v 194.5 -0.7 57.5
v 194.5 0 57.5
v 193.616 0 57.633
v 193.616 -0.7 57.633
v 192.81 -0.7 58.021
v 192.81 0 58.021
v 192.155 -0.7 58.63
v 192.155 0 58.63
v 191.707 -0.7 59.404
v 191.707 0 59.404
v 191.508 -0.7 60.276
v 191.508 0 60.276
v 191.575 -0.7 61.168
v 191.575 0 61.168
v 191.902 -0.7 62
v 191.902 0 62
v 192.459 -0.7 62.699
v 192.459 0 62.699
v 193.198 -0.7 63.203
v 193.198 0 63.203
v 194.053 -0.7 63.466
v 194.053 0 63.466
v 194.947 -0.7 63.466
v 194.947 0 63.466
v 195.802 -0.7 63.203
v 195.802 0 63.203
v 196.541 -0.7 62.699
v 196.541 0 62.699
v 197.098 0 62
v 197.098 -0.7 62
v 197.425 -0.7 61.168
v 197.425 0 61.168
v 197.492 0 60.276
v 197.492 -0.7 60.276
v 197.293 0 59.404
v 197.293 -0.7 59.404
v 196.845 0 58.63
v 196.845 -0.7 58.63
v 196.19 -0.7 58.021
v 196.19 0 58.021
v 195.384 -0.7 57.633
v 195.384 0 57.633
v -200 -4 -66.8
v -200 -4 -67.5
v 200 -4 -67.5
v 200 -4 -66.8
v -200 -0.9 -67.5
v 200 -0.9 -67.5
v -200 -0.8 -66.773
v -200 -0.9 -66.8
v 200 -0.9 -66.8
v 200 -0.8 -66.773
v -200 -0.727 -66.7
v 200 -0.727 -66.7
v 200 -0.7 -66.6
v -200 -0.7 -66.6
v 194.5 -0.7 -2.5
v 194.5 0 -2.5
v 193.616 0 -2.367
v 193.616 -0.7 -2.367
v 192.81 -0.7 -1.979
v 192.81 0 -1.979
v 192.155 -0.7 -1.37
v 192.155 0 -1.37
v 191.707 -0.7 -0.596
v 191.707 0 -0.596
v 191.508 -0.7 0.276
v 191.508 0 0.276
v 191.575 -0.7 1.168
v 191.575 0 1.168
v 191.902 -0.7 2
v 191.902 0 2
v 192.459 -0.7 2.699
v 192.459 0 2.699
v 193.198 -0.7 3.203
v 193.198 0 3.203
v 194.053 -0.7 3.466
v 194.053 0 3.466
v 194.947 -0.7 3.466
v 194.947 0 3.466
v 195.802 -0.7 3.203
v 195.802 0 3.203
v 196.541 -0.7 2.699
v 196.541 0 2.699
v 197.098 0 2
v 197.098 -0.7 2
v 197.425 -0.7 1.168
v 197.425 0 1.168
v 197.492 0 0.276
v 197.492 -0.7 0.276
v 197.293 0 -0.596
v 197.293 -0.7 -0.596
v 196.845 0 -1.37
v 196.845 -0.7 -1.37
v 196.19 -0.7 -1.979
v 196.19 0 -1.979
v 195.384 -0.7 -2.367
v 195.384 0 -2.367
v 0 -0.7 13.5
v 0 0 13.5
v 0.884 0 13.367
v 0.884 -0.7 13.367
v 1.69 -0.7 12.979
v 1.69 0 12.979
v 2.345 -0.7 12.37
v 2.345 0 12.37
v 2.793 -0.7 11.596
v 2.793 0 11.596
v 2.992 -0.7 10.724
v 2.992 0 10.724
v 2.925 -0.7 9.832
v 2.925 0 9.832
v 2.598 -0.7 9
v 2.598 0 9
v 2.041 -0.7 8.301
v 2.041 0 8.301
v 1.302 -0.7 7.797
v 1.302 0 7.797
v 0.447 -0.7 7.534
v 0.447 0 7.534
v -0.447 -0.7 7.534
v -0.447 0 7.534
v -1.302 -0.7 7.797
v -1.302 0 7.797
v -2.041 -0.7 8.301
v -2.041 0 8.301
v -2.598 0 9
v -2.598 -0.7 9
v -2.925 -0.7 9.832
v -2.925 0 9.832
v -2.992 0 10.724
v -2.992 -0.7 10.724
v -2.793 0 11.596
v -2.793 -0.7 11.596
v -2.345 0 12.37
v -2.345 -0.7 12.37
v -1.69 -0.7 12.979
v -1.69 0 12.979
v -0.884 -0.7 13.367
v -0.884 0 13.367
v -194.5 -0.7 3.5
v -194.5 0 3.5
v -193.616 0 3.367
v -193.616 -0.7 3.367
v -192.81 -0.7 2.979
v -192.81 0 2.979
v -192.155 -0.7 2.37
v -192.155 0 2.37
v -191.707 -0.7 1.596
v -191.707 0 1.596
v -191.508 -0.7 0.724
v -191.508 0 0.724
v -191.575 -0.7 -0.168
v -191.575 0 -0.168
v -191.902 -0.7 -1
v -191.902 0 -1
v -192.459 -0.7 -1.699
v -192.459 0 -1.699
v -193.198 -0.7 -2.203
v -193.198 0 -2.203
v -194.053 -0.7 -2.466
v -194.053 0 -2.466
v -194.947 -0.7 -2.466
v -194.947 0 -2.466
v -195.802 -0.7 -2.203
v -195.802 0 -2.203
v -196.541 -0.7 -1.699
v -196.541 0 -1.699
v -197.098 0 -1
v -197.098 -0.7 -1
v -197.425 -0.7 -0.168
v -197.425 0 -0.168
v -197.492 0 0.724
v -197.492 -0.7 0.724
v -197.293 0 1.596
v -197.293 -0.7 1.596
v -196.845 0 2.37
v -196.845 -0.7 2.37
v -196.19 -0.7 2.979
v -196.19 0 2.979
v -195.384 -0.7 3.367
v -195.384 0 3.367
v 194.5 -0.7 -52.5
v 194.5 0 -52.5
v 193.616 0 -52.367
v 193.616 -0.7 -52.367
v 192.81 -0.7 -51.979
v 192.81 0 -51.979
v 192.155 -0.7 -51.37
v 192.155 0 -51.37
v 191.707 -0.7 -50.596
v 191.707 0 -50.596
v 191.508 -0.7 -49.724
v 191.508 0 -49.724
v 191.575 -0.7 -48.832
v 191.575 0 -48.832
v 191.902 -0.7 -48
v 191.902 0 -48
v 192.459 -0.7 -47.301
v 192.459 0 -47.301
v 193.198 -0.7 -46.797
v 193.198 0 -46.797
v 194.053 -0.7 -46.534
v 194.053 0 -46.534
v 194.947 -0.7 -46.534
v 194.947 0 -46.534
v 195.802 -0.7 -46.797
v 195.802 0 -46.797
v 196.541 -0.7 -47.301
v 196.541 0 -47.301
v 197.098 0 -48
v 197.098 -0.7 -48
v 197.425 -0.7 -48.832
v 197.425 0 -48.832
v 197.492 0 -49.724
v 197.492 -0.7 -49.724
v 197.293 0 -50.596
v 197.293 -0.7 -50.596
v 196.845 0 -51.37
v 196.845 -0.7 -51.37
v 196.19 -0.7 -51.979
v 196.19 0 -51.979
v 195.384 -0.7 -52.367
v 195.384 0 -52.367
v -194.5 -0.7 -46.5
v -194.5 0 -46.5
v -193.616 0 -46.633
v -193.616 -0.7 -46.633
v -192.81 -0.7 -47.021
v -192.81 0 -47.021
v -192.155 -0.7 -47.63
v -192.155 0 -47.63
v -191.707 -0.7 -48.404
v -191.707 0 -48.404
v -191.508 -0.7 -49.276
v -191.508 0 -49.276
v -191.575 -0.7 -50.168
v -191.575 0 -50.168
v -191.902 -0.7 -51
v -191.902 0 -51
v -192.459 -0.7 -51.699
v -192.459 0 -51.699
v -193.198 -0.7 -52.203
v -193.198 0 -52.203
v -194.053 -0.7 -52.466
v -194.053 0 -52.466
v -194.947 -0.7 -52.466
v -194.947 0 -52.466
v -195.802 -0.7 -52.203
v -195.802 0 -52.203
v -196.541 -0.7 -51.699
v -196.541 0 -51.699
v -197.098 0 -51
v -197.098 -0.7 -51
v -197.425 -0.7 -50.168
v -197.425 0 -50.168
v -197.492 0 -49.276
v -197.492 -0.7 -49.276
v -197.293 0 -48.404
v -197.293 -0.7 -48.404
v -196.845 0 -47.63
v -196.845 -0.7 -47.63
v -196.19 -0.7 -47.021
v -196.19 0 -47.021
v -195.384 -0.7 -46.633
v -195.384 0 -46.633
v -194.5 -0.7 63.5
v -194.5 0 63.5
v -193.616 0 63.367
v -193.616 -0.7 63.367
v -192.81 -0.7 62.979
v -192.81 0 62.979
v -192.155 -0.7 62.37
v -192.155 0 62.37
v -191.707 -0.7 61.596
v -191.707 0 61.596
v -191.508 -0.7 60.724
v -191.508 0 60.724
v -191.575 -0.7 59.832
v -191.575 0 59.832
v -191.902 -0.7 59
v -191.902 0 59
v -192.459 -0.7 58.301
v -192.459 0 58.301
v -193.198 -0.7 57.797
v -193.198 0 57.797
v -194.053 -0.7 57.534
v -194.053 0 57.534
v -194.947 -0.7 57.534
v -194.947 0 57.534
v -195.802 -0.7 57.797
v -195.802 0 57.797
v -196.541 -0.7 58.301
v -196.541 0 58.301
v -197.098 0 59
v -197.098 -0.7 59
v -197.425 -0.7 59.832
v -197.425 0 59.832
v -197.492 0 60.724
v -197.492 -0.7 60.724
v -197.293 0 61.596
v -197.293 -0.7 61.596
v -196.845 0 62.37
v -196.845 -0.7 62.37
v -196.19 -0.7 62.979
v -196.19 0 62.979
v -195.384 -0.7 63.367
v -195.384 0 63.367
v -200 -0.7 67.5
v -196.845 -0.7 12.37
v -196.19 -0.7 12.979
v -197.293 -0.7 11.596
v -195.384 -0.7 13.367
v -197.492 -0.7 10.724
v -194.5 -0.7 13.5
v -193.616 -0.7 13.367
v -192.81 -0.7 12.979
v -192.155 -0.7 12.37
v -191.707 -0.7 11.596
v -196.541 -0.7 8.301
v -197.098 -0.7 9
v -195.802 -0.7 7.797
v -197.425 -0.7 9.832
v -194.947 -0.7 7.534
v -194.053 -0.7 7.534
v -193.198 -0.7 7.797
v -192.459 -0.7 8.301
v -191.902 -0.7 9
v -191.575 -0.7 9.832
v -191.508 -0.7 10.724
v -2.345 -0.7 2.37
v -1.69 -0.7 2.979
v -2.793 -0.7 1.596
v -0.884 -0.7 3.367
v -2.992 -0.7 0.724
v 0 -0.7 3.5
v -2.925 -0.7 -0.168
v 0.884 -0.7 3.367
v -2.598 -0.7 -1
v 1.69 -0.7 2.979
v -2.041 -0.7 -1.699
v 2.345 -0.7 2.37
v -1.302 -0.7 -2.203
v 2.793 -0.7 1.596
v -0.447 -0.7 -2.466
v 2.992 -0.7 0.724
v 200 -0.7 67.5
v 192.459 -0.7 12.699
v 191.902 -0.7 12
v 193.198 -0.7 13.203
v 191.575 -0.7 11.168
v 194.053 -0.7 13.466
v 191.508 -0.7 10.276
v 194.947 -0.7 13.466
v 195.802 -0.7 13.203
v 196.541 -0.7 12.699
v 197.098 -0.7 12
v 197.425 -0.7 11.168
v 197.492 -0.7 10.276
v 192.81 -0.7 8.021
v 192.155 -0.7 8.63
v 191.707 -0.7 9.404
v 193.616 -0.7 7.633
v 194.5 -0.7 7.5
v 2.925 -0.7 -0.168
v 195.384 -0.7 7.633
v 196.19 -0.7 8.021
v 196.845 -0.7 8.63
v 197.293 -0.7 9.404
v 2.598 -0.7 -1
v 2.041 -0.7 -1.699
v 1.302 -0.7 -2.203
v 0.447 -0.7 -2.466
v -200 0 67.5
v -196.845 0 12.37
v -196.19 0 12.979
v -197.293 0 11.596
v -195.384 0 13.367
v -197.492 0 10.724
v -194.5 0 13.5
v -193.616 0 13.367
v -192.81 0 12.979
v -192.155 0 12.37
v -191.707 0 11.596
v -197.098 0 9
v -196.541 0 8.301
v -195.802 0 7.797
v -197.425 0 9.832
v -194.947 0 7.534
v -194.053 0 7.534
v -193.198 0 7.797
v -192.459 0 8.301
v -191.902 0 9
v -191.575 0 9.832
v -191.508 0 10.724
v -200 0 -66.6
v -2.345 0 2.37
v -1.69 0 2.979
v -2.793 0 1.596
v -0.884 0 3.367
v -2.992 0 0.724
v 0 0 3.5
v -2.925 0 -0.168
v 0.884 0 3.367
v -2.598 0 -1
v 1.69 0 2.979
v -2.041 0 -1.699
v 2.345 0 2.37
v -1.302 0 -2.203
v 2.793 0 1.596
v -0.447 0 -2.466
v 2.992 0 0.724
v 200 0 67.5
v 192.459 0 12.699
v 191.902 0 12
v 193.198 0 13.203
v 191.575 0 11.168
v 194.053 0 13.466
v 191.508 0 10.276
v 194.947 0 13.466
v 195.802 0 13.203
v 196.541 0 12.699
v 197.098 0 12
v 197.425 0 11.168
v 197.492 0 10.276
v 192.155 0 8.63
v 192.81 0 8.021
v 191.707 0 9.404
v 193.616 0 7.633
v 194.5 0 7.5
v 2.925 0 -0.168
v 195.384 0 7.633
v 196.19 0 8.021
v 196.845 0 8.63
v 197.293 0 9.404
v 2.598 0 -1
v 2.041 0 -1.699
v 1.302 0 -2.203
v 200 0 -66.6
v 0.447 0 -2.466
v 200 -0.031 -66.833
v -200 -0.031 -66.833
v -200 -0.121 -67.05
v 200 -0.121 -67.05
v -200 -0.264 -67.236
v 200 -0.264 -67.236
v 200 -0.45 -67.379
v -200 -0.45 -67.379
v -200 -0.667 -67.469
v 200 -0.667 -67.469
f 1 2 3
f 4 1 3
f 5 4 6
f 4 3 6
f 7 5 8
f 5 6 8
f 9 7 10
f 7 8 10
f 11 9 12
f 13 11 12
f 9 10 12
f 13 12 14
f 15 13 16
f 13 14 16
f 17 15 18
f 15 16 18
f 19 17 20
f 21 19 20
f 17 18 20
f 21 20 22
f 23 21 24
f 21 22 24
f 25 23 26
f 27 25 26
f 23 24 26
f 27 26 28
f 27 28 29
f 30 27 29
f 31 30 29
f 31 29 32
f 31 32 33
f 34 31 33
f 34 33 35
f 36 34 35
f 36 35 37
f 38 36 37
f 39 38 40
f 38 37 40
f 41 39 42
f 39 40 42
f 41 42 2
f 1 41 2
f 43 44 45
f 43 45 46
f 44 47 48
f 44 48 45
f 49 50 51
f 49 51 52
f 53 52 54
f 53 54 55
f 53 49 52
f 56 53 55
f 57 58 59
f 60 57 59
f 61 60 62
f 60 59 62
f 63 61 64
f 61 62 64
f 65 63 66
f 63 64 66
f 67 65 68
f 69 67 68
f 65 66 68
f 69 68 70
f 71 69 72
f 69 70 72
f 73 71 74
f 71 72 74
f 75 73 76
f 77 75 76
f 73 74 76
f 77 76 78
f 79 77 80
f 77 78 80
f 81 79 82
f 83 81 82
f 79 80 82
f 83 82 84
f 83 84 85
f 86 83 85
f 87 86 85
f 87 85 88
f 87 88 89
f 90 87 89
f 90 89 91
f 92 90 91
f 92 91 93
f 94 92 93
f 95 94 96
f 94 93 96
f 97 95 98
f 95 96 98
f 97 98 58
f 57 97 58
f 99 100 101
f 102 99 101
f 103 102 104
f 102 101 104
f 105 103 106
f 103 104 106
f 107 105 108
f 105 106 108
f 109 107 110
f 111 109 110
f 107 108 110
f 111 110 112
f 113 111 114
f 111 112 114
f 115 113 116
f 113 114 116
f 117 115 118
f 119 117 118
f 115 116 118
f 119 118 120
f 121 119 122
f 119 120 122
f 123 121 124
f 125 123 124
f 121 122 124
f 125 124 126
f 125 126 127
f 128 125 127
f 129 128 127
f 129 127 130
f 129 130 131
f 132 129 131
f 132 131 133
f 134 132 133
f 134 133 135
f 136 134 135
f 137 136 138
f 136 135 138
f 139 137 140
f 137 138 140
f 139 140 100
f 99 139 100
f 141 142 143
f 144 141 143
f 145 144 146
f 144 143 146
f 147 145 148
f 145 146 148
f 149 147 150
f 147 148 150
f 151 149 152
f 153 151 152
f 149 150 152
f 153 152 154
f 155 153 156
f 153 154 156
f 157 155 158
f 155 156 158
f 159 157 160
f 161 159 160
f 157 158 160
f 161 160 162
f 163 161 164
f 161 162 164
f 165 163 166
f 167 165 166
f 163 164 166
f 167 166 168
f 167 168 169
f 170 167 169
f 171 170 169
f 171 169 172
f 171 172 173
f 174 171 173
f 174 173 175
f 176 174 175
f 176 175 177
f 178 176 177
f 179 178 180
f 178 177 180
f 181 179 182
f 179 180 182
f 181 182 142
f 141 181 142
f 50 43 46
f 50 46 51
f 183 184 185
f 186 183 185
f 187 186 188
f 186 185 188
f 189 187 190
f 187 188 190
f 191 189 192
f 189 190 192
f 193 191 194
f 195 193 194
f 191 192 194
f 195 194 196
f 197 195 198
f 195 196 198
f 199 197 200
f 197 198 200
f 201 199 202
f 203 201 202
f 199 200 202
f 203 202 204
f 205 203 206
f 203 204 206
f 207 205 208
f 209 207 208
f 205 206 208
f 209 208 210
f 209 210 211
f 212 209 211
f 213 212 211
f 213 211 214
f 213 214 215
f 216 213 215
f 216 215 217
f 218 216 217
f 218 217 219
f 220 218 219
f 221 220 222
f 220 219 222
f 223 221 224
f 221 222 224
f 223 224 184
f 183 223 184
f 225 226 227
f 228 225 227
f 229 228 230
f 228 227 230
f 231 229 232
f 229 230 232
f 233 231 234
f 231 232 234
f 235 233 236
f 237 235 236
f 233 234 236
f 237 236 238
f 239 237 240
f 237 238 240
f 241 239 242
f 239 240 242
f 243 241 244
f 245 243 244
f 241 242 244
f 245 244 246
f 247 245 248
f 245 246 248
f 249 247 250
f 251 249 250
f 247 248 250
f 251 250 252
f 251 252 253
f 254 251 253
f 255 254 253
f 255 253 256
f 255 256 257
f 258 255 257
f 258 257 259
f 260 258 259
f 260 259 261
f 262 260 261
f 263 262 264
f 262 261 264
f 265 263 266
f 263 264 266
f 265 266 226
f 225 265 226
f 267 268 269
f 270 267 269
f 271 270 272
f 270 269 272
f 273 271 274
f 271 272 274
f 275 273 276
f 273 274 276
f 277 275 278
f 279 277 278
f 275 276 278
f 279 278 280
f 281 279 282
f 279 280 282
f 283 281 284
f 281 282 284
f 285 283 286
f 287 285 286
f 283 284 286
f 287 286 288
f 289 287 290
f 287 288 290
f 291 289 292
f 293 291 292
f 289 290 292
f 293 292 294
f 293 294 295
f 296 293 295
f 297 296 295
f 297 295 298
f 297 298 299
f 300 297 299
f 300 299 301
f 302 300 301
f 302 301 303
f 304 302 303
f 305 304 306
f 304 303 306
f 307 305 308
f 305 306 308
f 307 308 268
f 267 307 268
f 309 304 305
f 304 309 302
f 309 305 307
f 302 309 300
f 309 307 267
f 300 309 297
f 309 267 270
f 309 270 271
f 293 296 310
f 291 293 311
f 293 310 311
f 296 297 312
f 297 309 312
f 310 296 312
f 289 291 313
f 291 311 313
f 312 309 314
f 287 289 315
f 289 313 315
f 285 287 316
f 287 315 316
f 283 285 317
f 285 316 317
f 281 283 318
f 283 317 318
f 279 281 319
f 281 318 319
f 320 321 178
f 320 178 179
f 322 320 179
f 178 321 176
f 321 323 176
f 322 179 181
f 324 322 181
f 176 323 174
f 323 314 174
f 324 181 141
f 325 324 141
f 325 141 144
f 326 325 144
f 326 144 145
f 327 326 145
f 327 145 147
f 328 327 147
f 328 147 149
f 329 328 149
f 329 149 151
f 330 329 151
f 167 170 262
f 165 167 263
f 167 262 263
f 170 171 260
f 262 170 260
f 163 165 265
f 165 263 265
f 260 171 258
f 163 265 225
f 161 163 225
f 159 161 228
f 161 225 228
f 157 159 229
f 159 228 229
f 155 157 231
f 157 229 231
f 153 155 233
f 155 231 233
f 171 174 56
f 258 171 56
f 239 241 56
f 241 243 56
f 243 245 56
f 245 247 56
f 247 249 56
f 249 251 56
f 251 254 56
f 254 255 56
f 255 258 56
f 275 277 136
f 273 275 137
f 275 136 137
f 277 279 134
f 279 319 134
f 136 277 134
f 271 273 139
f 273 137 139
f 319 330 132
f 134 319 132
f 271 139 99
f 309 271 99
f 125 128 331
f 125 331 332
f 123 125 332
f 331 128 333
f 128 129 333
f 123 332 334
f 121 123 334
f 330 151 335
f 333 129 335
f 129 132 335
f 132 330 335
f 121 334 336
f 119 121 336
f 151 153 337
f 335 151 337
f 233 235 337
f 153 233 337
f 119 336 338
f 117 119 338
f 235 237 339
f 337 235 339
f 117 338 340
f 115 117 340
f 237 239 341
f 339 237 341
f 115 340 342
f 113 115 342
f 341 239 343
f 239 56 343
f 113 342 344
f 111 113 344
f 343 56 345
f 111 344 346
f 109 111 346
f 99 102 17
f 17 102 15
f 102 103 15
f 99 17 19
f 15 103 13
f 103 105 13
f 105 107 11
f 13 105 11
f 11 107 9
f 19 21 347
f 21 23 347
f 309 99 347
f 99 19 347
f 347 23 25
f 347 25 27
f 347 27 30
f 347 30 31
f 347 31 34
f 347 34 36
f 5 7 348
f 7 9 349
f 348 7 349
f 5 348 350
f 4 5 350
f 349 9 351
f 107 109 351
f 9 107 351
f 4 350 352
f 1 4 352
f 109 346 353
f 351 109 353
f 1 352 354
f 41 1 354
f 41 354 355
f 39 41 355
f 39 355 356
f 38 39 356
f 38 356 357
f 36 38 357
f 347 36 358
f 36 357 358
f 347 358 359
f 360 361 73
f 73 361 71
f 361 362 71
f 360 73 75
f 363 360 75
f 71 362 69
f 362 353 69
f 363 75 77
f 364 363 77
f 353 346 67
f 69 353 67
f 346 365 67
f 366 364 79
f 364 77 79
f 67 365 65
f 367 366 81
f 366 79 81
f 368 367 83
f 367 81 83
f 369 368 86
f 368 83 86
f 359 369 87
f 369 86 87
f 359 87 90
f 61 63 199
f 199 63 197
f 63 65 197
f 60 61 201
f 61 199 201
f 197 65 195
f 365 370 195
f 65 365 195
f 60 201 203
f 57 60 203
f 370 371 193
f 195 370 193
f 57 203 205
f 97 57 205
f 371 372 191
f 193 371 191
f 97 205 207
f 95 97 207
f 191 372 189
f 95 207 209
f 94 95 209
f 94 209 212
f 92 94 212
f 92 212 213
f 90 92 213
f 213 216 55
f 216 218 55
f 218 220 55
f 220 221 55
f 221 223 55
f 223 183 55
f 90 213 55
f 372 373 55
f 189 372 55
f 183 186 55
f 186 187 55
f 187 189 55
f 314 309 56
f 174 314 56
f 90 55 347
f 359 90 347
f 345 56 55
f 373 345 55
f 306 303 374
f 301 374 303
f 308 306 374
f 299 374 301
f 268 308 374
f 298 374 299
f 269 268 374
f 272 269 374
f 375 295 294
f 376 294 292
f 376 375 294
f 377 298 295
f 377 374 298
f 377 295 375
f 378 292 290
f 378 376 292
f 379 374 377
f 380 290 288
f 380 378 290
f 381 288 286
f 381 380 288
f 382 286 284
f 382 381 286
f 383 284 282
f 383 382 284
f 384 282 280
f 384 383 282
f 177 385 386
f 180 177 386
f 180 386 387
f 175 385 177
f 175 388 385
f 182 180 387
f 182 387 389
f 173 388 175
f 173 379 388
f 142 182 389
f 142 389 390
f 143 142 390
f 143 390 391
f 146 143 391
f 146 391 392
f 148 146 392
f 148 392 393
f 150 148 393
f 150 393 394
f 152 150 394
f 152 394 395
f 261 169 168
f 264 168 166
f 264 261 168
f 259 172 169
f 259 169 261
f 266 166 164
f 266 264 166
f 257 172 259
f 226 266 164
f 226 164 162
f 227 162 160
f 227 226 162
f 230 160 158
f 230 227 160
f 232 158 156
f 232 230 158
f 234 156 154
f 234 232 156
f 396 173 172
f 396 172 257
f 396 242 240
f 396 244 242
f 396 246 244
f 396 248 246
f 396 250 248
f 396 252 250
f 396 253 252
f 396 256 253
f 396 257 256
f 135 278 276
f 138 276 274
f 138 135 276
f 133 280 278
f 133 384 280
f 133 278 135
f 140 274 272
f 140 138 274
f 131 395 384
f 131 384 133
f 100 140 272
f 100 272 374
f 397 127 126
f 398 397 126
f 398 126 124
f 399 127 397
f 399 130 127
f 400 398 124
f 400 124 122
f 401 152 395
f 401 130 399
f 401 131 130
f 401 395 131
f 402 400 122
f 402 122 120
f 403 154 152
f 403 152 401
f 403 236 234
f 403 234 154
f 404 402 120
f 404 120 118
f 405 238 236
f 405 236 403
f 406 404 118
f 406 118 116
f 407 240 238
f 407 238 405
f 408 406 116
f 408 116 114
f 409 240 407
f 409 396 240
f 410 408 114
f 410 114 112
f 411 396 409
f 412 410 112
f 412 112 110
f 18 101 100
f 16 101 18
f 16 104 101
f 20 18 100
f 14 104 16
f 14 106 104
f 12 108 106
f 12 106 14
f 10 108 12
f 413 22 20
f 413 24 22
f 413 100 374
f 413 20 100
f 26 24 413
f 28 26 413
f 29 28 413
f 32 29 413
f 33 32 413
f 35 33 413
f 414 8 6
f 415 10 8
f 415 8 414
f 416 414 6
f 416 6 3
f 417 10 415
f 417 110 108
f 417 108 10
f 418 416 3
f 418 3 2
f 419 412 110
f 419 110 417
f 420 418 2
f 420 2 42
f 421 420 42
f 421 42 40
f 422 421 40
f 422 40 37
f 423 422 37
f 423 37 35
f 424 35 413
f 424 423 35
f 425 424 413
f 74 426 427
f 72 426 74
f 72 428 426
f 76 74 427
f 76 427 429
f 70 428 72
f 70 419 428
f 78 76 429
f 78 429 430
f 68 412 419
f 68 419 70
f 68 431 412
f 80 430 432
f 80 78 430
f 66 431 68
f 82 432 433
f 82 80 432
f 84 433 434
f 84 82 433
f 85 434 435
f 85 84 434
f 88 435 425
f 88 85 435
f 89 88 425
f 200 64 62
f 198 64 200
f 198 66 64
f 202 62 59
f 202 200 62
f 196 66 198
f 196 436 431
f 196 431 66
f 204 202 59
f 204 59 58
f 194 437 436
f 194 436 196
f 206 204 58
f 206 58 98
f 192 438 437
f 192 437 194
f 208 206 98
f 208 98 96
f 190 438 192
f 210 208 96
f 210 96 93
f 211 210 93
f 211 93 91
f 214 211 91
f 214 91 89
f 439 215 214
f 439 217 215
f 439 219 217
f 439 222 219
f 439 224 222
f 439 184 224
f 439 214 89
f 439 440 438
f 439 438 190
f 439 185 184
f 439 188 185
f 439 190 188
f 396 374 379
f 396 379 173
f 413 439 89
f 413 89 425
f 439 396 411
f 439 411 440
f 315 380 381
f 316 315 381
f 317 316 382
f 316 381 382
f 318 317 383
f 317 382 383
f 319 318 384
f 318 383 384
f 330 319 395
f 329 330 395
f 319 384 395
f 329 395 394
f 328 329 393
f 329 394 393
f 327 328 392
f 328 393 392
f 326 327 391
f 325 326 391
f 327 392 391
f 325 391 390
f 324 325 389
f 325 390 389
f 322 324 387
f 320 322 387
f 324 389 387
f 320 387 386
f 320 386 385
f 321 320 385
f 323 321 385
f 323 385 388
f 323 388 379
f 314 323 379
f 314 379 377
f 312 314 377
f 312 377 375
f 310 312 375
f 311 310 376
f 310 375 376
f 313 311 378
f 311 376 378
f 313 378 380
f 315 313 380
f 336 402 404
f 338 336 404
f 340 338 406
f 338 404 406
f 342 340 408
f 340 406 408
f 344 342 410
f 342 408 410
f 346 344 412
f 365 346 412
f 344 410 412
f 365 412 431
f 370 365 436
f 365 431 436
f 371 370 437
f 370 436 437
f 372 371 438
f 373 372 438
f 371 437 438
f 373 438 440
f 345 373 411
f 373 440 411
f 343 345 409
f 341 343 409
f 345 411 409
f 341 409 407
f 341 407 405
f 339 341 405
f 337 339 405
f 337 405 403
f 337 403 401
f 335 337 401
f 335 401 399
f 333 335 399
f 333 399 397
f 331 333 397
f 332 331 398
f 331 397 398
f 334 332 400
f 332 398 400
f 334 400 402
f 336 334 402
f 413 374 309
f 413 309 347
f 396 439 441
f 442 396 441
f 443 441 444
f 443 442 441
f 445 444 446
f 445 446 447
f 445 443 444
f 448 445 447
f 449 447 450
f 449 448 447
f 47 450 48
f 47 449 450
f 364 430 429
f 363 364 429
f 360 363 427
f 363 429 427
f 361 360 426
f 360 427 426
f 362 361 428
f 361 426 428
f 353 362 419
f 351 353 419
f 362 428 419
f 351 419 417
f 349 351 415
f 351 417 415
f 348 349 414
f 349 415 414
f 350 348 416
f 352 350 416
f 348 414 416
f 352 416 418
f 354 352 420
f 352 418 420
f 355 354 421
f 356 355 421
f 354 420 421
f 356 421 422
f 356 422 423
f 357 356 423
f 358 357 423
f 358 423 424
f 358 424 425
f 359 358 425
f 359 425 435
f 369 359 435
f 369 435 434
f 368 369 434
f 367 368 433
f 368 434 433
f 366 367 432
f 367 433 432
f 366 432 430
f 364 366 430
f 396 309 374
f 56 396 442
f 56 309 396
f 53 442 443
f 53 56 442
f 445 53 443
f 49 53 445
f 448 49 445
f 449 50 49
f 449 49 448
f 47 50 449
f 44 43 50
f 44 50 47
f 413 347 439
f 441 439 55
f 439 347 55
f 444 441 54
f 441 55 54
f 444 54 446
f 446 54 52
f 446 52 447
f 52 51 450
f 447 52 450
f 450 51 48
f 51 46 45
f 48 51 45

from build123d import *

# Parameters (mm, degrees)
SKETCH_1_W                       = 400
SKETCH_1_H                       = 135
SKETCH_1_R                       = 3
SM_BASE_FLANGE_1_DEPTH           = 0.7
SM_EDGE_FLANGE_1_STRIP_W         = 3.2
SM_EDGE_FLANGE_1_STRIP_H         = 0.7
SM_EDGE_FLANGE_1_STRIP_CUT_DEPTH = 400
SM_EDGE_FLANGE_1_DEPTH           = 400


# Sheet-metal steps are written as plain solids
with BuildPart() as part:
    # Sketch 1 → 基体-法兰1 (new body)
    with BuildSketch(Plane(origin=(0, 0, 0), x_dir=(1, 0, 0), z_dir=(0, 1, 0))):
        Rectangle(SKETCH_1_W, SKETCH_1_H)
        with Locations(Location((-194.5, -60.5, 0), (0, 0, 270))):
            Circle(SKETCH_1_R, mode=Mode.SUBTRACT)
        with Locations(Location((-194.5, -10.5, 0), (0, 0, 270))):
            Circle(SKETCH_1_R, mode=Mode.SUBTRACT)
        with Locations(Location((-194.5, -0.5, 0), (0, 0, 270))):
            Circle(SKETCH_1_R, mode=Mode.SUBTRACT)
        with Locations(Location((-194.5, 49.5, 0), (0, 0, 270))):
            Circle(SKETCH_1_R, mode=Mode.SUBTRACT)
        with Locations(Location((0, -10.5, 0), (0, 0, 270))):
            Circle(SKETCH_1_R, mode=Mode.SUBTRACT)
        with Locations(Location((0, -0.5, 0), (0, 0, 270))):
            Circle(SKETCH_1_R, mode=Mode.SUBTRACT)
        with Locations(Location((194.5, -60.5, 0), (0, 0, 90))):
            Circle(SKETCH_1_R, mode=Mode.SUBTRACT)
        with Locations(Location((194.5, -10.5, 0), (0, 0, 90))):
            Circle(SKETCH_1_R, mode=Mode.SUBTRACT)
        with Locations(Location((194.5, -0.5, 0), (0, 0, 90))):
            Circle(SKETCH_1_R, mode=Mode.SUBTRACT)
        with Locations(Location((194.5, 49.5, 0), (0, 0, 90))):
            Circle(SKETCH_1_R, mode=Mode.SUBTRACT)
    extrude(amount=-SM_BASE_FLANGE_1_DEPTH)

    # 边线-法兰1 strip (across the edge) → 边线-法兰1 strip cut (cut)
    with BuildSketch(Plane(origin=(-200, -0.7, -67.5), x_dir=(0, 0, 1), z_dir=(1, 0, 0))):
        with Locations((-0.7, -0.35)):
            Rectangle(SM_EDGE_FLANGE_1_STRIP_W, SM_EDGE_FLANGE_1_STRIP_H)
    extrude(amount=SM_EDGE_FLANGE_1_STRIP_CUT_DEPTH, mode=Mode.SUBTRACT)

    # 边线-法兰1 section (across the edge) → 边线-法兰1 (add)
    with BuildSketch(Plane(origin=(-200, -0.7, -67.5), x_dir=(0, 0, 1), z_dir=(1, 0, 0))):
        with BuildLine():
            Line((0, 0.2), (0, 3.3))
            Line((0, 3.3), (0.7, 3.3))
            Line((0.7, 3.3), (0.7, 0.2))
            ThreePointArc((0.7, 0.2), (0.758578644, 0.058578644), (0.9, 0))
            Line((0.9, 0), (0.9, -0.7))
            ThreePointArc((0.9, -0.7), (0.263603897, -0.436396103), (0, 0.2))
        make_face()
    extrude(amount=SM_EDGE_FLANGE_1_DEPTH)


solid = part.part
